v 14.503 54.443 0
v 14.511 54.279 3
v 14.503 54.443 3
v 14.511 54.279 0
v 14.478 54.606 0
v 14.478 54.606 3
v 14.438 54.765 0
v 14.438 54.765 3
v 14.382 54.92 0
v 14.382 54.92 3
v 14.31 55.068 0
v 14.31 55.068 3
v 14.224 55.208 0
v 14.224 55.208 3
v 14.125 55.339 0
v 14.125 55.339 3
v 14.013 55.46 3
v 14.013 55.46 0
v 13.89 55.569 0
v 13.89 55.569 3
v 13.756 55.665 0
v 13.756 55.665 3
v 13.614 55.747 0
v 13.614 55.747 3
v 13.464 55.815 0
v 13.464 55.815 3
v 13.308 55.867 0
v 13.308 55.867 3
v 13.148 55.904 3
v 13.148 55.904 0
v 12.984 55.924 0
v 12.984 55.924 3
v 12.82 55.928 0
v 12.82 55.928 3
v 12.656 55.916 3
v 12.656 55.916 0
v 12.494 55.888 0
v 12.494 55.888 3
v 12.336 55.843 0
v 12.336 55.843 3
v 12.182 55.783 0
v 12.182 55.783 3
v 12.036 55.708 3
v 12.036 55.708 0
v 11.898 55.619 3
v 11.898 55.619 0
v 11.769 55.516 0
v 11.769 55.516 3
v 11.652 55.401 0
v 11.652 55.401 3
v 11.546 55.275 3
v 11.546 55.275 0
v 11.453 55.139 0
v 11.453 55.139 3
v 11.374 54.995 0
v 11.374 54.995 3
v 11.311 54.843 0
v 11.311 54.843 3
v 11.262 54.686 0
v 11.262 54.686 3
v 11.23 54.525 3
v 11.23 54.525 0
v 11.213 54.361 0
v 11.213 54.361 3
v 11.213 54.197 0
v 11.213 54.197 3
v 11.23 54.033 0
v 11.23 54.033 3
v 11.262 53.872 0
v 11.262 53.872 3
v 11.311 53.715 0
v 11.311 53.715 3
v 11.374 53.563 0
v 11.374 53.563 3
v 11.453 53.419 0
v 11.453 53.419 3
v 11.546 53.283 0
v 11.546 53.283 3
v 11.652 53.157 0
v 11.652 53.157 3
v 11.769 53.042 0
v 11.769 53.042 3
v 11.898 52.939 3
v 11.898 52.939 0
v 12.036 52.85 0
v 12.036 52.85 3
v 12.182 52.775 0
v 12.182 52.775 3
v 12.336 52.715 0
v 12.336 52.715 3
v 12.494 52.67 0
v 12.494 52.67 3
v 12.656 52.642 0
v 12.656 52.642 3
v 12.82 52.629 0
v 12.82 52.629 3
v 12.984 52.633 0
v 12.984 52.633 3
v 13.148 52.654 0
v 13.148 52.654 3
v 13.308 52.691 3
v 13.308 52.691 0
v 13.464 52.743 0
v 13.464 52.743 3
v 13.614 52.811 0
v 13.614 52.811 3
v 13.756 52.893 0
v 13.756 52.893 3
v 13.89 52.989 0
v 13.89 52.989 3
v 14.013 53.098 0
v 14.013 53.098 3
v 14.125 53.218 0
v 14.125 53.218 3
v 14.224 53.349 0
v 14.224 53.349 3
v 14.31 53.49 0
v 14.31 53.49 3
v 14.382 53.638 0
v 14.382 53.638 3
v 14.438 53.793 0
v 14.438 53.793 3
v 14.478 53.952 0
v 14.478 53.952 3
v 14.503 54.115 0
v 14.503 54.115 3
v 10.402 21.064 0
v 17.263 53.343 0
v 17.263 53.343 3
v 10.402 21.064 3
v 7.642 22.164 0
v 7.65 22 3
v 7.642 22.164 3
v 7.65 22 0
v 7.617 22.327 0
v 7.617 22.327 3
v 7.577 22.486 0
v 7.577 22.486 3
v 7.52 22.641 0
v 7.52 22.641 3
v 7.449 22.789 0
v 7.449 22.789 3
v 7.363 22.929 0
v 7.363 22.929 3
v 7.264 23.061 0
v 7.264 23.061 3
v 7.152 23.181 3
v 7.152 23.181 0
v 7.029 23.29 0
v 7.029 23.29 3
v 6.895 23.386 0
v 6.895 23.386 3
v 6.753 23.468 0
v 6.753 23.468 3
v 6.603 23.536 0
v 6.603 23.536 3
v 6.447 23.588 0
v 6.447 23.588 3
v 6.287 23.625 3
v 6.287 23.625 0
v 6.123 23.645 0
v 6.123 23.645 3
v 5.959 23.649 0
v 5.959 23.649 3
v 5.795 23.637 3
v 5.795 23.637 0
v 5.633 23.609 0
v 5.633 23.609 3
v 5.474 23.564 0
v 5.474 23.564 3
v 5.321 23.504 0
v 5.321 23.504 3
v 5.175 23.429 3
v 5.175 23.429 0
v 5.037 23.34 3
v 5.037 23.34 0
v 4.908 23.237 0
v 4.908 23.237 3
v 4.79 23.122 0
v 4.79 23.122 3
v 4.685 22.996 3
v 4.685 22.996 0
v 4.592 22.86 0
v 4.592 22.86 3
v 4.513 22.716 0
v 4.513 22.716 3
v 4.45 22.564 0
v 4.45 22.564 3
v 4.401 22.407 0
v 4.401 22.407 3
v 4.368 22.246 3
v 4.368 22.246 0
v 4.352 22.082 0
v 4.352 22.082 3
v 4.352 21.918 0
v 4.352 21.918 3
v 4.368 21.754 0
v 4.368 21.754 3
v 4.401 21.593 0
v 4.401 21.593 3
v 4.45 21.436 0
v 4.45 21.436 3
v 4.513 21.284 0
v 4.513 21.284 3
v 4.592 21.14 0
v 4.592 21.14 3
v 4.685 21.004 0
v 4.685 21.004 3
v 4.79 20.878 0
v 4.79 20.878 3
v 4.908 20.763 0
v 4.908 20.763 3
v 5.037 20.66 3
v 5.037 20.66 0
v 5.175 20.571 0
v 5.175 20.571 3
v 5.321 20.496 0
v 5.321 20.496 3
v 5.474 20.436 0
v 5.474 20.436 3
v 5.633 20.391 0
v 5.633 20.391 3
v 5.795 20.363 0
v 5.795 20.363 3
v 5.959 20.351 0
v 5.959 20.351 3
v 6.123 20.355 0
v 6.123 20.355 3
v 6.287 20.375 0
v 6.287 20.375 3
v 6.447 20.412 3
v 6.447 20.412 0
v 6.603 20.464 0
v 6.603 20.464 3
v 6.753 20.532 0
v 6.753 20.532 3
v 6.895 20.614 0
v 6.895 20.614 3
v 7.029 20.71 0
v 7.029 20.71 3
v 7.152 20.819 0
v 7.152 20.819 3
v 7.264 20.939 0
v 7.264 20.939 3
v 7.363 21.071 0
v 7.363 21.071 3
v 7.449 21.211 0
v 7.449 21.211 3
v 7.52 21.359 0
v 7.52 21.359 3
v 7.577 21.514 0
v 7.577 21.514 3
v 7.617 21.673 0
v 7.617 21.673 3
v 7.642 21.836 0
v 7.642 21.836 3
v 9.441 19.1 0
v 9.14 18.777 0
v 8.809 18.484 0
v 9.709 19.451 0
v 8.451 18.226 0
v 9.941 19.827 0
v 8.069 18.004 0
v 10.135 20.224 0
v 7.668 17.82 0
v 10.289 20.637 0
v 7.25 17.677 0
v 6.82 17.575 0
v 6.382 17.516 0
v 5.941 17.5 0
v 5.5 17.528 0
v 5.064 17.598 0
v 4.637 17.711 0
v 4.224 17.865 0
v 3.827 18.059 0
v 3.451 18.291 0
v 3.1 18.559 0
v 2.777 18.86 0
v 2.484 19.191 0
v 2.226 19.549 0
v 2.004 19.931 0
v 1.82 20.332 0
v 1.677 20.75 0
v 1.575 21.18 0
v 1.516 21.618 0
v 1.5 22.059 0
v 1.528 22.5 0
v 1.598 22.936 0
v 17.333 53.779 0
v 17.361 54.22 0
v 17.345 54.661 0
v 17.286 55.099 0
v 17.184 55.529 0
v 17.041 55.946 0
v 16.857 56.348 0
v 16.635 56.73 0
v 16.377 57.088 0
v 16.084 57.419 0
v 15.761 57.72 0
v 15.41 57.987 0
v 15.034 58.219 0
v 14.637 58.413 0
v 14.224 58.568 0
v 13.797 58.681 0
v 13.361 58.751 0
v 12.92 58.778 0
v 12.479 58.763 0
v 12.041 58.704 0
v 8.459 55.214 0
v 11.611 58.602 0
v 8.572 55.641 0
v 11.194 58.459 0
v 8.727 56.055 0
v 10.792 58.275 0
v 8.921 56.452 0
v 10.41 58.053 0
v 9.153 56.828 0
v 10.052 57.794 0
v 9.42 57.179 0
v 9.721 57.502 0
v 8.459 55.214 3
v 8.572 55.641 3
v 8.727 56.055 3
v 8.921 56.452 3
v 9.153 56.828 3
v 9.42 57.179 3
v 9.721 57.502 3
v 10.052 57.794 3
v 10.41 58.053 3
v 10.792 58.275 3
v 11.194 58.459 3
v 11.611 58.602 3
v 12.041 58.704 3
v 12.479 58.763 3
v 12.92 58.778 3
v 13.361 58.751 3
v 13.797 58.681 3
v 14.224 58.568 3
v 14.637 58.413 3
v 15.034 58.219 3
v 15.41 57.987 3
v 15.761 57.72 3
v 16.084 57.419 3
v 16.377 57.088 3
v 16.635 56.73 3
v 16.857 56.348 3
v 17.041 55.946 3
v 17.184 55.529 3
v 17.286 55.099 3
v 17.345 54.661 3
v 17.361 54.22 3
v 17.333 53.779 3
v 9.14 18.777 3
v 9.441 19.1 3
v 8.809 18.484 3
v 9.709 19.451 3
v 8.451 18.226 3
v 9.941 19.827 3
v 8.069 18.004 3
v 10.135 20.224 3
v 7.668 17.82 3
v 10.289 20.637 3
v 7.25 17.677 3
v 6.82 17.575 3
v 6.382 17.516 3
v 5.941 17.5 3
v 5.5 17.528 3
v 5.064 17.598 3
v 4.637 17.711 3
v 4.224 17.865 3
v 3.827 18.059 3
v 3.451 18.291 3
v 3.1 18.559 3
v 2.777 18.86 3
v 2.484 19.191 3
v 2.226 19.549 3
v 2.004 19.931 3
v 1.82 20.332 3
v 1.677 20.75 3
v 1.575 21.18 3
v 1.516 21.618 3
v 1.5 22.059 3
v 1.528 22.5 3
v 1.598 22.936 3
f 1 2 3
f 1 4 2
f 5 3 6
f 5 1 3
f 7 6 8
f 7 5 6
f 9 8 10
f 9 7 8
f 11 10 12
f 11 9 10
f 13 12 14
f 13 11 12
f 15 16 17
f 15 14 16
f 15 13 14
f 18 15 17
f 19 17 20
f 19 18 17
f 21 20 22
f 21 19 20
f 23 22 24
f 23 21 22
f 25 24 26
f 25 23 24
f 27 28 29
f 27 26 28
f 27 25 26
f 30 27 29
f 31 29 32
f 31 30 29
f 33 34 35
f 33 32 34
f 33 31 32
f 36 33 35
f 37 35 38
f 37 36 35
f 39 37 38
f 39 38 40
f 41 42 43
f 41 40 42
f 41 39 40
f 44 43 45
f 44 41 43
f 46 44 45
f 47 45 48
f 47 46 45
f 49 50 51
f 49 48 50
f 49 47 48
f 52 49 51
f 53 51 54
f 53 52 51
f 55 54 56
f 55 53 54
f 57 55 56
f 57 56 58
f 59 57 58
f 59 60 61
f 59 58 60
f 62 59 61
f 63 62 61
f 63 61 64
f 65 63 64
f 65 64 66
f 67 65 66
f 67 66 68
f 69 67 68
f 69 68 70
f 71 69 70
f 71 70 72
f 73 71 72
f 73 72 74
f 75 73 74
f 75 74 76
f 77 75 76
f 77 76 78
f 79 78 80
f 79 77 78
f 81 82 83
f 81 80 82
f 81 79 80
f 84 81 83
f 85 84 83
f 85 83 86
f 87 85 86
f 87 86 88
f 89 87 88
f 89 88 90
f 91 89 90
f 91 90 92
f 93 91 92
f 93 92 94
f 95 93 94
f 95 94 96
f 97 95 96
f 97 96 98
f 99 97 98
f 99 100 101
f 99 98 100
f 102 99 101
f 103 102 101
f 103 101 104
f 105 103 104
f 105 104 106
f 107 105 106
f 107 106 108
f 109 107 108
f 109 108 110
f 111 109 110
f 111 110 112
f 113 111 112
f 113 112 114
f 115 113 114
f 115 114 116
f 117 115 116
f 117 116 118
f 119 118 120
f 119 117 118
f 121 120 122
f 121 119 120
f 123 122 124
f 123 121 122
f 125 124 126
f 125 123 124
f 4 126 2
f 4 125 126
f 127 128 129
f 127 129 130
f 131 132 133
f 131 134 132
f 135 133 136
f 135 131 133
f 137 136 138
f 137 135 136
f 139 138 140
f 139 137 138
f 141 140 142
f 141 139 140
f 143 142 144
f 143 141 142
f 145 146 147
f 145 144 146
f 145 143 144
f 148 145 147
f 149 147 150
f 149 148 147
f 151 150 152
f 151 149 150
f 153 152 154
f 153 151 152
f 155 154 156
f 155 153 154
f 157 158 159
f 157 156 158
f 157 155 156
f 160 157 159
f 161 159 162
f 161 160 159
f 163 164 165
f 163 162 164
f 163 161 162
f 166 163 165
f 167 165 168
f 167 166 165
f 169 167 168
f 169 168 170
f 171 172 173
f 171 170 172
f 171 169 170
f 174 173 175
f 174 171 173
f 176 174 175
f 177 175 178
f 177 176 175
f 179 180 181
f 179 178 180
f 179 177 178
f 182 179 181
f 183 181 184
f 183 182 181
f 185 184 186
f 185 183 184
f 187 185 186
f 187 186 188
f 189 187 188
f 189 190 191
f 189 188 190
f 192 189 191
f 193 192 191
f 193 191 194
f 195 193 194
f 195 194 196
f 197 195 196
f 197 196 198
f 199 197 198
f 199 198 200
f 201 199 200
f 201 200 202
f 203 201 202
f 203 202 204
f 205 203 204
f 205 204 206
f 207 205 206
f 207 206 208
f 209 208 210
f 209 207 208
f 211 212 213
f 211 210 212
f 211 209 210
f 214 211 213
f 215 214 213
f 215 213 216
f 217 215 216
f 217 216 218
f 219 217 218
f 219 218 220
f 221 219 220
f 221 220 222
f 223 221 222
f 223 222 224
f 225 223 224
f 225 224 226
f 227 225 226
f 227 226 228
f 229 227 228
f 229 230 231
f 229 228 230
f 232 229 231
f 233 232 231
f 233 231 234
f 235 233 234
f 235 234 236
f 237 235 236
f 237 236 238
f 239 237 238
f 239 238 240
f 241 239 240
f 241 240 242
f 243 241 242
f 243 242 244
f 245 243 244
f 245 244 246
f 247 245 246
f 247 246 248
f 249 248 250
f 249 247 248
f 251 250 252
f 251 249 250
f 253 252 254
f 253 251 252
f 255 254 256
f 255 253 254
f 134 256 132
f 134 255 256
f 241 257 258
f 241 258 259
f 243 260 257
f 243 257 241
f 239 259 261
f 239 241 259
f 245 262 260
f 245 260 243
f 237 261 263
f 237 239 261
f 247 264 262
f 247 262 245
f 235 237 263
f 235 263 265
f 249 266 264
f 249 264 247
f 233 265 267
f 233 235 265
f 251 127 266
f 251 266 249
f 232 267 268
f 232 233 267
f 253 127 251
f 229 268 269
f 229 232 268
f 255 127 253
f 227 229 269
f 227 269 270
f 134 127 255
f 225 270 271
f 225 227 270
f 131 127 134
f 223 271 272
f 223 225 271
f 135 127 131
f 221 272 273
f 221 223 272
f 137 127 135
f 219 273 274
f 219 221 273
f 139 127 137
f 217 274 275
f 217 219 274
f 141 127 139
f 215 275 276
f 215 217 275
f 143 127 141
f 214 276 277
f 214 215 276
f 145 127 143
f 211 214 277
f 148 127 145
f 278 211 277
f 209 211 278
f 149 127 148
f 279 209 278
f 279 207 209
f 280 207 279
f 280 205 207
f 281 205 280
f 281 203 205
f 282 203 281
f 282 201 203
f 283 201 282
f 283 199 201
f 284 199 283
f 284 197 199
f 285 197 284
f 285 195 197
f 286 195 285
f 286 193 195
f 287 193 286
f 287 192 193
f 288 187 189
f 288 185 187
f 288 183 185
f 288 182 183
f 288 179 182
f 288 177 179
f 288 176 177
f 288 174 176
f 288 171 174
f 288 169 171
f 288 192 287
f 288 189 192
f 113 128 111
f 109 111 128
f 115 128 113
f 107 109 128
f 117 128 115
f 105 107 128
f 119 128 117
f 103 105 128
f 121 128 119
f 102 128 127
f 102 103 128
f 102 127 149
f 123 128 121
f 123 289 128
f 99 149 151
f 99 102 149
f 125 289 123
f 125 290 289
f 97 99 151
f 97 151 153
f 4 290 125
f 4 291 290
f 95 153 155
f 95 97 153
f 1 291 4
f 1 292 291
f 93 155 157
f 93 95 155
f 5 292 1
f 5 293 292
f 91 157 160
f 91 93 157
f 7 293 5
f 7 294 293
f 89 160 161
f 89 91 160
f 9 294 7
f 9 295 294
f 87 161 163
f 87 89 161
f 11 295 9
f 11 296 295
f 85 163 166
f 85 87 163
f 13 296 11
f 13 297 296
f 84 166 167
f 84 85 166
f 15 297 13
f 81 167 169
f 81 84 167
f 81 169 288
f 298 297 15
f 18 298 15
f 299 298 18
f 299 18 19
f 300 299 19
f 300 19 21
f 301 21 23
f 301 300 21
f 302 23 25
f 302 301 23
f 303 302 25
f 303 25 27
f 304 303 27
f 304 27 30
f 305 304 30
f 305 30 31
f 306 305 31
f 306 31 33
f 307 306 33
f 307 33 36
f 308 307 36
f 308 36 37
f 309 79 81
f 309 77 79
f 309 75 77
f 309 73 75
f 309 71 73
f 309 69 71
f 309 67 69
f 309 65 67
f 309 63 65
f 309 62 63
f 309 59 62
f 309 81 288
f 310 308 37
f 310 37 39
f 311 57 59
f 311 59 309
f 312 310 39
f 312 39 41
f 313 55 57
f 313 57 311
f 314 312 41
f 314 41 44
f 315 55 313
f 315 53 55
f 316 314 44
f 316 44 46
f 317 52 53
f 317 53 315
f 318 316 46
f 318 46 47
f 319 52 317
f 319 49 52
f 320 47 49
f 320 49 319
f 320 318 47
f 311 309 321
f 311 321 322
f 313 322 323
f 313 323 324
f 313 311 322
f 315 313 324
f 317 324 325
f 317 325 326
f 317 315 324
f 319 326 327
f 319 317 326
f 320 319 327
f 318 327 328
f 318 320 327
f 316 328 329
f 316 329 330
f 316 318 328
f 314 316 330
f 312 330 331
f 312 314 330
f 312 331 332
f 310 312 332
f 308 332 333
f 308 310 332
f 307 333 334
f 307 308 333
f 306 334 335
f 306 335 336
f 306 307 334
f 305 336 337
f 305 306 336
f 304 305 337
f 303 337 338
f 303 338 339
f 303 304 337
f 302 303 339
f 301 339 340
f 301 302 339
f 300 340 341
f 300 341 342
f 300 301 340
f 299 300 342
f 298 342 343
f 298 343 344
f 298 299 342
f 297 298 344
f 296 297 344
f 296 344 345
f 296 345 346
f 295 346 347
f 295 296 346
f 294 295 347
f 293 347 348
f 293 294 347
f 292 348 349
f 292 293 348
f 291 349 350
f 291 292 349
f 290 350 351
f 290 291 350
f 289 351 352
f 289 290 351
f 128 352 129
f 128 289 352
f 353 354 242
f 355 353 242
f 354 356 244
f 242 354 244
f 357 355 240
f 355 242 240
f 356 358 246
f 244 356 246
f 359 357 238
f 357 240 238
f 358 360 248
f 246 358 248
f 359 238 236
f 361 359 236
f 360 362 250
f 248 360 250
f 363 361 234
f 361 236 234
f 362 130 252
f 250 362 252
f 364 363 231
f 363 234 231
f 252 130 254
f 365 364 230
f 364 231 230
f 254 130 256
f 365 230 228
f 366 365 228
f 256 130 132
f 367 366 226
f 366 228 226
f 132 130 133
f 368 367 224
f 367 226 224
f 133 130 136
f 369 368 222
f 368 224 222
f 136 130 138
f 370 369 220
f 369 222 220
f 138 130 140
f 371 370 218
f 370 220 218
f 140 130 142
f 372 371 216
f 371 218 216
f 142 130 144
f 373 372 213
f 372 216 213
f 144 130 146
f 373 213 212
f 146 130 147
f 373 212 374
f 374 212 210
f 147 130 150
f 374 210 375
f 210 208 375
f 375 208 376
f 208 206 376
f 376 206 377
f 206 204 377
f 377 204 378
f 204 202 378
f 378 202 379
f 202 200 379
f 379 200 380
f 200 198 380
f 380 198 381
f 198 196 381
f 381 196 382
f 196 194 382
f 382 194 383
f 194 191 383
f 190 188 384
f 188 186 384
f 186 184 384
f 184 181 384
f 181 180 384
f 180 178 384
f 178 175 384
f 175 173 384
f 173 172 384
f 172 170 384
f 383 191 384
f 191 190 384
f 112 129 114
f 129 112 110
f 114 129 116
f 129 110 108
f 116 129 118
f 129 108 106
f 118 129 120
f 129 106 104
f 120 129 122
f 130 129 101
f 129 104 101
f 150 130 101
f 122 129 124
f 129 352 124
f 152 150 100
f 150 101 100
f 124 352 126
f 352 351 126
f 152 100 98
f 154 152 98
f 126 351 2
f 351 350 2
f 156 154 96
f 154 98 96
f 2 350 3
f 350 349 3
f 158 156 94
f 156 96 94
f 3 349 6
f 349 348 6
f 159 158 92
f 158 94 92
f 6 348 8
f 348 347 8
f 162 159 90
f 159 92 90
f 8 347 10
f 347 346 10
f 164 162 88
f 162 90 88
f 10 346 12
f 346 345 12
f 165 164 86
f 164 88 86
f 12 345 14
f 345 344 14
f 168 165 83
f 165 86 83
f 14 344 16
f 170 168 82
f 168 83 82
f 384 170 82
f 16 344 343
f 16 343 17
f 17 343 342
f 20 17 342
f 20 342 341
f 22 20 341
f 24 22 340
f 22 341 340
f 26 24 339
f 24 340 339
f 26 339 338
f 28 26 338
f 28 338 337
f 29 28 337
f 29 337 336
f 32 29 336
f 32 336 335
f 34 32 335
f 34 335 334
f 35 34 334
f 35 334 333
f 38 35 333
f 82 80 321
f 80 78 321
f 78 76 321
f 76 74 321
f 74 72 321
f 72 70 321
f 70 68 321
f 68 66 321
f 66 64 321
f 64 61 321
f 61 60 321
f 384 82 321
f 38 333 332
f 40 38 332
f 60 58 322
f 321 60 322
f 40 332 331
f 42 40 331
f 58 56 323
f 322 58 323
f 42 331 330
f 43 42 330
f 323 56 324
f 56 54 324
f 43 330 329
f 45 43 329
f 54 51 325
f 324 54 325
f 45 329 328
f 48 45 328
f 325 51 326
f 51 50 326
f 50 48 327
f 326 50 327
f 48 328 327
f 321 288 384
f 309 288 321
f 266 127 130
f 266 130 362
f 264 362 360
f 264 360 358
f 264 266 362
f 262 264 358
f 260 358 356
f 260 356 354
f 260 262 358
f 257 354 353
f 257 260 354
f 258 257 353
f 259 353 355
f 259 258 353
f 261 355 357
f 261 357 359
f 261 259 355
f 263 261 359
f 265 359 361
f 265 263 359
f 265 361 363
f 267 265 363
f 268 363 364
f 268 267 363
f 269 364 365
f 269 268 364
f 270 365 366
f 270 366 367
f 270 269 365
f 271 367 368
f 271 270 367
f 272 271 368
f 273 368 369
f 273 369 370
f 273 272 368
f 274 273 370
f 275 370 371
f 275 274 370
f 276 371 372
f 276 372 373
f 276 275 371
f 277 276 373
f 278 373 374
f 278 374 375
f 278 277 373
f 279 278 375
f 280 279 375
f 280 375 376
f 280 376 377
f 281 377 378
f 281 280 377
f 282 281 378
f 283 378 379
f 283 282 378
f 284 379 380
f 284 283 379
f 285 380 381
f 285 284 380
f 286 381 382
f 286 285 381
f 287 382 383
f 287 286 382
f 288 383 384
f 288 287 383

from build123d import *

# Parameters (mm, degrees)
PLASTINA_DEPTH        = 3
OTVERSTIYA_DEPTH      = 62.362552644
OTVERSTIYA_DEPTH_BACK = 62.362552644
ESKIZ_OTVERSTIYA_R    = 1.65


with BuildPart() as part:
    # Eskiz_kontur → Plastina (new body)
    with BuildSketch(Plane.XY):
        with BuildLine():
            Line((17.26275, 53.34327), (10.40166, 21.0644))
            ThreePointArc((10.40166, 21.0644), (5.0644, 17.59834), (1.59834, 22.9356))
            Line((1.59834, 22.9356), (8.45942, 55.21447))
            ThreePointArc((8.45942, 55.21447), (13.796685, 58.680535), (17.26275, 53.34327))
        make_face()
    extrude(amount=PLASTINA_DEPTH)

    # Eskiz_otverstiya → Otverstiya (cut, two sides: drawn at the far end of the back side and taken through both)
    with BuildSketch(Plane.XY.offset(-OTVERSTIYA_DEPTH_BACK)):
        with Locations((6, 22)):
            Circle(ESKIZ_OTVERSTIYA_R)
        with Locations((12.86109, 54.27887)):
            Circle(ESKIZ_OTVERSTIYA_R)
    extrude(amount=OTVERSTIYA_DEPTH + OTVERSTIYA_DEPTH_BACK, mode=Mode.SUBTRACT)


solid = part.part
